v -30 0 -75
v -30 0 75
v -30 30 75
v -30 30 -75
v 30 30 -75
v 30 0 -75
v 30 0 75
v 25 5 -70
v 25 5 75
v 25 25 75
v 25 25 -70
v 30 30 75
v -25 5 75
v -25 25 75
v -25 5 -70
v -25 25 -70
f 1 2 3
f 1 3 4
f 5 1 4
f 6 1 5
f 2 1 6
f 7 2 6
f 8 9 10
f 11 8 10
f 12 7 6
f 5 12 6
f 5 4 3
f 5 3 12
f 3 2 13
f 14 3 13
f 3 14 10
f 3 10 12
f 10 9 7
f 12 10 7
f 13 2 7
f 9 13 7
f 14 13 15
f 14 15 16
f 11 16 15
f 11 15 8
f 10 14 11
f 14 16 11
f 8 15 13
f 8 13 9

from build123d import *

# Parameters (mm, degrees)
ESQUISSE1_W                  = 60
ESQUISSE1_H                  = 150
BOSS_EXTRU_1_DEPTH           = 30
ESQUISSE2_W                  = 50
ESQUISSE2_H                  = 20
ENL_V_MAT_EXTRU_1_DEPTH      = 75
ENL_V_MAT_EXTRU_1_DEPTH_BACK = 70


with BuildPart() as part:
    # Esquisse1 → Boss.-Extru.1 (new body)
    with BuildSketch(Plane(origin=(0, 0, 0), x_dir=(1, 0, 0), z_dir=(0, 1, 0))):
        Rectangle(ESQUISSE1_W, ESQUISSE1_H)
    extrude(amount=BOSS_EXTRU_1_DEPTH)

    # Esquisse2 → Enlèv. mat.-Extru.1 (cut, two sides)
    with BuildSketch(Plane.XY) as enl_v_mat_extru_1_sk:
        with Locations((0, 15)):
            Rectangle(ESQUISSE2_W, ESQUISSE2_H)
    extrude(amount=ENL_V_MAT_EXTRU_1_DEPTH, mode=Mode.SUBTRACT)
    extrude(enl_v_mat_extru_1_sk.sketch, amount=-ENL_V_MAT_EXTRU_1_DEPTH_BACK, mode=Mode.SUBTRACT)


solid = part.part
